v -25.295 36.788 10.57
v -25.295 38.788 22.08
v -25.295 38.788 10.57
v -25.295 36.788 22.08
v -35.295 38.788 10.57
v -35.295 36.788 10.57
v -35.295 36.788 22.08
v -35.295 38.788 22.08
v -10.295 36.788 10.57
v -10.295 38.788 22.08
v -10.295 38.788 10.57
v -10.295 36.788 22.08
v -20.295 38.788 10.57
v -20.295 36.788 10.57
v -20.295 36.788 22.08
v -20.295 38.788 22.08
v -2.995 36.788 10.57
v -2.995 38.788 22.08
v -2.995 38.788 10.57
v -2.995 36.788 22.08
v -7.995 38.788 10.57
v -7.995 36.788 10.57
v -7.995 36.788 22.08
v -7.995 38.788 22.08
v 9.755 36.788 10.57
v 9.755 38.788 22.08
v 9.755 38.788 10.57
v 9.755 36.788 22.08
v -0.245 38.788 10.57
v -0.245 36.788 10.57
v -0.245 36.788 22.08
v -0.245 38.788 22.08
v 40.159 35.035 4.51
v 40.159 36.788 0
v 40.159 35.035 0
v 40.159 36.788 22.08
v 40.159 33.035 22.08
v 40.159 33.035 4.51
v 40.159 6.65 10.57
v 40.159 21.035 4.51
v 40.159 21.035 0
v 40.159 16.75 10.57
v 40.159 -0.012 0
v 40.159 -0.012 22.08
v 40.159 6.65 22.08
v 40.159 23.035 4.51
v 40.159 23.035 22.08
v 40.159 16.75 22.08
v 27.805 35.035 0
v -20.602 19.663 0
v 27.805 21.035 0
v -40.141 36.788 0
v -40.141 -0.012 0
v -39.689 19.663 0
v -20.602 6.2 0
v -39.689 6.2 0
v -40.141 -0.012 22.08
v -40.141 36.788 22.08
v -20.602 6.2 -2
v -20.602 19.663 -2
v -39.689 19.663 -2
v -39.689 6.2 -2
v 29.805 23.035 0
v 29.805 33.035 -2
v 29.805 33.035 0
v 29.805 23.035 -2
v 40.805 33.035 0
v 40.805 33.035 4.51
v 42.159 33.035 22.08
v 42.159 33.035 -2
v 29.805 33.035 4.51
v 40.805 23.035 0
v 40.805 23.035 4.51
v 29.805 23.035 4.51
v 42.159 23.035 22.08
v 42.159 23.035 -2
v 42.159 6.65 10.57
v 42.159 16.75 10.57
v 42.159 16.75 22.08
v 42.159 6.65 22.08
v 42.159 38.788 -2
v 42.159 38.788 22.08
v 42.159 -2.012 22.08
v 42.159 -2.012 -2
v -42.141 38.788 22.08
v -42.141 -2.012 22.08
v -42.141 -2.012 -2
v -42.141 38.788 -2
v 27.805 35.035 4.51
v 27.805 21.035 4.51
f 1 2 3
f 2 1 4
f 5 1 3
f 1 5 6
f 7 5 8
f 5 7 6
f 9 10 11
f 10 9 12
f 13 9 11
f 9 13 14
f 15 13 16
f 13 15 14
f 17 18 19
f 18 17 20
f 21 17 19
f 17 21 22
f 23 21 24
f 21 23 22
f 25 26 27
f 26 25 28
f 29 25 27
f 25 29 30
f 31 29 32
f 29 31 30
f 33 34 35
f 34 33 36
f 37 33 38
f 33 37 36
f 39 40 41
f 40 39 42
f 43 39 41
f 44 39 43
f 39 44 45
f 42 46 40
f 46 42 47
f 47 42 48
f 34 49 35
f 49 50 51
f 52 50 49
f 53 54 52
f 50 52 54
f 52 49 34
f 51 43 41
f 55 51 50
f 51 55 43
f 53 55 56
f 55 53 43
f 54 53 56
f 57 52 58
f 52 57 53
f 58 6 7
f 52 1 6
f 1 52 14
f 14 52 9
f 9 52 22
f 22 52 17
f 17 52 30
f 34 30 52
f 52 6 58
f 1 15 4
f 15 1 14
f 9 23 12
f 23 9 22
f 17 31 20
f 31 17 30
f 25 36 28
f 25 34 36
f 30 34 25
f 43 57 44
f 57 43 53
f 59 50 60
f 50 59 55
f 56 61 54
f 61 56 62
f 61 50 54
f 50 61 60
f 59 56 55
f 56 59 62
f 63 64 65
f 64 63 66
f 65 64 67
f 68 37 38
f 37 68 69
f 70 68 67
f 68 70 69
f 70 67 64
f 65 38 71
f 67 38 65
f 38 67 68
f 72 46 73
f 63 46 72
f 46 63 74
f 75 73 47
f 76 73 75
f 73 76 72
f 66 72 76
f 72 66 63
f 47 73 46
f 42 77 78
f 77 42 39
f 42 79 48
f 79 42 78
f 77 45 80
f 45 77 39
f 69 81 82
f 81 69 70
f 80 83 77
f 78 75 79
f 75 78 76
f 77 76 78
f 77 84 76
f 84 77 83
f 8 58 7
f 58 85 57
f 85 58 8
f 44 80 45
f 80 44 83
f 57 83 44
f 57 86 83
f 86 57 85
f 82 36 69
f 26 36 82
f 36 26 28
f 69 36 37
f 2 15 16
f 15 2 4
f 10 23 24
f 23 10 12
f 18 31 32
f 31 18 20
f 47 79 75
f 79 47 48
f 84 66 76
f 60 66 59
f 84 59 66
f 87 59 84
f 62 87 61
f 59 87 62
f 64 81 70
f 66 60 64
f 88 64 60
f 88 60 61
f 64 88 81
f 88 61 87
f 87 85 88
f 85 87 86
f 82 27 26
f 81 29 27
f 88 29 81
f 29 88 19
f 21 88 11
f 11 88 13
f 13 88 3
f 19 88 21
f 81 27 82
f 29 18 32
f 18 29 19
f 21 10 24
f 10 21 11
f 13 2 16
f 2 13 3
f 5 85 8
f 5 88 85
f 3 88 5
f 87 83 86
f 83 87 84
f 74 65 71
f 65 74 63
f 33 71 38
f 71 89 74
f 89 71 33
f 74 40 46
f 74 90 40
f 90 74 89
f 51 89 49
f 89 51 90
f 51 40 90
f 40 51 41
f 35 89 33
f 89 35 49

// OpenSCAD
xOffset = -0.0045;
yOffset = 0.012;
pcbWidth = 80.2955 - xOffset;
pcbHeight = 36.812 - yOffset;
pcbThickness = 1.7;
lidToCopper=15.57;
lidToIndicatorTop=28.18;
lidToSwitchContactTop=20.08;
wallThickness = 2;
thinGap = 0.5;
lidToRim=13.13;

padX = 5;
padY = 10;

nPadCenter = [3.451803, 11.711994];
lPadCenter = [16.539201, 11.711994];
lampCutoutRadius = 6.231573;

lampCutoutPos = [nPadCenter[0] - (padX / 2), nPadCenter[1] - (padY / 2)];
lampCutoutSize = [(lPadCenter[0] + (padX / 2)) - (nPadCenter[0] - (padX / 2)), lampCutoutRadius * 2];

nInPad = [9.845502, 32.211994];
lInPad = [24.845502, 32.211994];
sInPad = [34.645502, 32.561994];
oInPad = [44.895502, 32.561994];

slotWidth = 10;
slotHeight = 30;

conLedCenter = [71.770502, 11.711994];
conOptCenter = [73.745502, 28.046994];

conOptSize = [7.6, 10];
conLedSize = [12.35, 6.1];


/*mirror([1,0,0]) {*/
    translate([-(pcbWidth/2 + xOffset), 0, 0]){
        translate([-wallThickness - xOffset, -wallThickness - yOffset, -wallThickness]) {
            difference() {
                cube([2 * wallThickness + pcbWidth, 2 * wallThickness + pcbHeight, 2 * wallThickness + lidToSwitchContactTop]);
                translate([wallThickness, wallThickness, wallThickness]) {
                    cube([pcbWidth, pcbHeight, wallThickness + lidToSwitchContactTop + 0.01]);

                    translate([lampCutoutPos[0] - thinGap, lampCutoutPos[1] - thinGap,-wallThickness -0.01]) {
                        cube([lampCutoutSize[0] + 2 * thinGap, lampCutoutSize[1] + 2 * thinGap, wallThickness + 0.02]);
                    }

                    translate([0, 0, (lidToSwitchContactTop - (lidToSwitchContactTop - lidToCopper)) - 5  /*- slotHeight*/]) {
                        translate([nInPad[0] - slotWidth / 2, pcbHeight - 0.01, 0]) {
                            cube([slotWidth, wallThickness + 0.02, slotHeight]);
                        }

                        translate([lInPad[0] - slotWidth / 2, pcbHeight - 0.01, 0]) {
                            cube([slotWidth, wallThickness + 0.02, slotHeight]);
                        }

                        translate([sInPad[0] - slotWidth / 4, pcbHeight - 0.01, 0]) {
                            cube([slotWidth / 2, wallThickness + 0.02, slotHeight]);
                        }

                        translate([oInPad[0] - slotWidth / 2, pcbHeight - 0.01, 0]) {
                            cube([slotWidth, wallThickness + 0.02, slotHeight]);
                        }
                    }

                    translate([conOptCenter[0] - conOptSize[0] / 2, conOptCenter[1] - conOptSize[1] / 2, -wallThickness - 0.01]) {
                        cube([conOptSize[0] + 10, conOptSize[1],wallThickness + (lidToSwitchContactTop - lidToCopper) + pcbThickness  + 0.02 + 30]);
                    }


                    translate([pcbWidth - 0.01, conLedCenter[1] - conLedSize[1] / 2 - 2, (lidToSwitchContactTop - (lidToSwitchContactTop - lidToCopper)) - 5]) {
                        cube([wallThickness + 0.02, conLedSize[1] + 4,wallThickness + (lidToSwitchContactTop - lidToCopper) + pcbThickness + 0.02 + 5 ]);
                    }
                }
            }

            translate([wallThickness, wallThickness, wallThickness]) {
                translate([conOptCenter[0] - conOptSize[0] / 2 - wallThickness, conOptCenter[1] - conOptSize[1] / 2, 0]) {
                    cube([wallThickness, conOptSize[1], (lidToSwitchContactTop - lidToCopper)]);
                }
                translate([conOptCenter[0] - conOptSize[0] / 2 - wallThickness, conOptCenter[1] - conOptSize[1] / 2 - wallThickness, 0]) {
                    cube([conOptSize[1] + wallThickness + 1, wallThickness, (lidToSwitchContactTop - lidToCopper)]);
                }
                translate([conOptCenter[0] - conOptSize[0] / 2 - wallThickness, conOptCenter[1] + conOptSize[1] / 2 , 0]) {
                    cube([conOptSize[1] + wallThickness + 1, wallThickness, (lidToSwitchContactTop - lidToCopper)]);
                }
            }
        }
    }
/*}*/
